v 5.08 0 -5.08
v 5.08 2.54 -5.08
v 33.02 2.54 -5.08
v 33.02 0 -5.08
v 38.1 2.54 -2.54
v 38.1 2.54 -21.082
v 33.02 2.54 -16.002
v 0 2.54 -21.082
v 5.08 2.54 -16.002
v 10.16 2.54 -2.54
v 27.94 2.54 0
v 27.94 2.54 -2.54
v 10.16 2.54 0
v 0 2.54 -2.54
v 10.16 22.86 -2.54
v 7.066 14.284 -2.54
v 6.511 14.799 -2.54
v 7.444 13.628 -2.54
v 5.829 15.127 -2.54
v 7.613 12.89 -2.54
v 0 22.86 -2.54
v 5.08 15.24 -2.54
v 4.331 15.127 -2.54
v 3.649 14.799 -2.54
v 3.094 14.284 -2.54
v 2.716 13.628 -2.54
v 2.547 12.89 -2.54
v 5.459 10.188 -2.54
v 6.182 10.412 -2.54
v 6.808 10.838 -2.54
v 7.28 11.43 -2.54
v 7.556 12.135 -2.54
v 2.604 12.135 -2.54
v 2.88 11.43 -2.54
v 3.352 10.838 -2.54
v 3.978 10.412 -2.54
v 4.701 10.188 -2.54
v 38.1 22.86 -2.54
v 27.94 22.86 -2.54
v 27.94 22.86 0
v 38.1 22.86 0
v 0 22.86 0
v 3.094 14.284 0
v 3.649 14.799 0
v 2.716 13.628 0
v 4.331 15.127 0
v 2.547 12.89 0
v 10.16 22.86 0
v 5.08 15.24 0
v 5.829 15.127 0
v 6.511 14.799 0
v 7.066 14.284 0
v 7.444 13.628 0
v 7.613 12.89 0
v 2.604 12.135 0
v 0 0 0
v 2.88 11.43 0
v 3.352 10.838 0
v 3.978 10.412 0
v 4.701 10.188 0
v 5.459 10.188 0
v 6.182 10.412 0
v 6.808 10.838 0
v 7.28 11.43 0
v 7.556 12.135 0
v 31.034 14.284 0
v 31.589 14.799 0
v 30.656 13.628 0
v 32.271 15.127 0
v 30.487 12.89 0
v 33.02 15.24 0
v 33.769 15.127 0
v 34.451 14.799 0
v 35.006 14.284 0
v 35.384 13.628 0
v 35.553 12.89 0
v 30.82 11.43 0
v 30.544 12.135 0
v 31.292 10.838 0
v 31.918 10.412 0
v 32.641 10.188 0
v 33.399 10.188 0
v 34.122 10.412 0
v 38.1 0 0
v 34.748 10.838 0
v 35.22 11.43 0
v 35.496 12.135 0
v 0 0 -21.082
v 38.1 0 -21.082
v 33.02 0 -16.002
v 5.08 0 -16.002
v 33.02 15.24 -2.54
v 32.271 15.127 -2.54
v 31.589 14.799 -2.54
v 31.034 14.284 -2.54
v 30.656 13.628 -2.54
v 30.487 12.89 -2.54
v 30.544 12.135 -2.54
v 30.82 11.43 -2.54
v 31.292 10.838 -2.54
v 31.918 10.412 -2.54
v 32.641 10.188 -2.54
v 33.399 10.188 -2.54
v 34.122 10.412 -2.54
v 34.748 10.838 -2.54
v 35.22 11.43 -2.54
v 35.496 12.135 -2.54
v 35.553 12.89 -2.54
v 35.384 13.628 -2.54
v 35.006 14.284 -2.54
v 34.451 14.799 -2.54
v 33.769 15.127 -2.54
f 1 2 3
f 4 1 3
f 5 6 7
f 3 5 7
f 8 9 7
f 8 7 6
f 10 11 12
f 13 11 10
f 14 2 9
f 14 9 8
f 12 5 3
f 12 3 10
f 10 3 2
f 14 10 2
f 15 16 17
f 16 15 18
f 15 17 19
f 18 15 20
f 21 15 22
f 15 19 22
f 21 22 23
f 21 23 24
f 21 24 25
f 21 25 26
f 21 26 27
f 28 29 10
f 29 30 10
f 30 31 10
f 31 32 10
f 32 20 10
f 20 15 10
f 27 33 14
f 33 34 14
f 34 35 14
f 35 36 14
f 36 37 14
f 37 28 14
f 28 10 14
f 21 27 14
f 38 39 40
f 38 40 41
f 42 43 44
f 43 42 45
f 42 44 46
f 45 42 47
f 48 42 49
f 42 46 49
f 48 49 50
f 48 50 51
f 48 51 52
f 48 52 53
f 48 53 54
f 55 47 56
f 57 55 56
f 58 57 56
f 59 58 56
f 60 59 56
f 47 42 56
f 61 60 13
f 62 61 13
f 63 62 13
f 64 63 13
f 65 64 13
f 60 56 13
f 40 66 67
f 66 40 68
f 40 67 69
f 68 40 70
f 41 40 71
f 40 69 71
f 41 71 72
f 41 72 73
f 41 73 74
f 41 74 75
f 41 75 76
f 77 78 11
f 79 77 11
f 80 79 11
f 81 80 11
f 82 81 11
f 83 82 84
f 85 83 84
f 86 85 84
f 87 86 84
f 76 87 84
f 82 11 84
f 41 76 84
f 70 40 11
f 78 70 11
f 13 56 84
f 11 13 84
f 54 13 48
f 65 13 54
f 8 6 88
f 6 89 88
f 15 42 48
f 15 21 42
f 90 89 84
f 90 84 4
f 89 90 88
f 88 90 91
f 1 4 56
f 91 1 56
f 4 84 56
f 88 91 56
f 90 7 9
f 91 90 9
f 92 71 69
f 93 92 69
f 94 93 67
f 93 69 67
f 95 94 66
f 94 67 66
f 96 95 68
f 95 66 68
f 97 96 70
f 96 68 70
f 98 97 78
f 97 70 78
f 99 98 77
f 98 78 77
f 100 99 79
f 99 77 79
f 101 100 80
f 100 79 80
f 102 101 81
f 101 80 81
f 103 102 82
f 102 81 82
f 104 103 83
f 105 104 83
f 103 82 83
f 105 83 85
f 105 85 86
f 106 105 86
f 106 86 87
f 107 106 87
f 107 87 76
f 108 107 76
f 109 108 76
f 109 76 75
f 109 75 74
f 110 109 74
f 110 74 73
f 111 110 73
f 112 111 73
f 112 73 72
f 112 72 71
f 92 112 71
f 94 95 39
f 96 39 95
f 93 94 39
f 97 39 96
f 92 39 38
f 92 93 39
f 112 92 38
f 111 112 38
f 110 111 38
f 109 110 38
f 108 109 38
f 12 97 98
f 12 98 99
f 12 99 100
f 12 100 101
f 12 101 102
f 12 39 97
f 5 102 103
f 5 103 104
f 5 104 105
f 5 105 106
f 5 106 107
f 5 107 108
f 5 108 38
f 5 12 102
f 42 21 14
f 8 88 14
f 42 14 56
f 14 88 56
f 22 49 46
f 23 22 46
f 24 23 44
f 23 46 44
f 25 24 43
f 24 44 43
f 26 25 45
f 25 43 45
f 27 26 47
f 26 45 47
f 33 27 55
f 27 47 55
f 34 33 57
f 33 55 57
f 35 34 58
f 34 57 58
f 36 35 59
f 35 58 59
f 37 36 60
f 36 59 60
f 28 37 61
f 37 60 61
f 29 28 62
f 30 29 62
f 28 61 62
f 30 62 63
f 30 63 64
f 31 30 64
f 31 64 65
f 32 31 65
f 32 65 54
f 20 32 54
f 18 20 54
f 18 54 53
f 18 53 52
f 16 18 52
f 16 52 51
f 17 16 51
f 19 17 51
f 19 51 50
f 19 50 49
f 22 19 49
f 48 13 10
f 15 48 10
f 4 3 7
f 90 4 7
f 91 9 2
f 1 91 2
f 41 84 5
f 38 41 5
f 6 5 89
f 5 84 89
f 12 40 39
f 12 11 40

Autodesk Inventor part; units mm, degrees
ref_plane "YZ Plane" through (0, 0, 0) normal (1, 0, 0) x (0, 1, 0)
ref_plane "XZ Plane" through (0, 0, 0) normal (0, 1, 0) x (-1, 0, 0)
ref_plane "XY Plane" through (0, 0, 0) normal (0, 0, 1) x (1, 0, 0)
sketch "Sketch1" plane through (0, 0, 0) normal (0, 1, 0) x (-1, 0, 0)
  point P0 (0, 0)
sketch "Sketch2" plane through (0, 0, 0) normal (0, 1, 0) x (-1, 0, 0)
  line L0 (0, 0) -> (-38.1, 0)
  line L1 (-38.1, 0) -> (-38.1, -21.082)
  line L2 (-38.1, -21.082) -> (0, -21.082)
  line L3 (0, -21.082) -> (0, 0)
  dimension "d0" = 38.1
  dimension "d1" = 21.082
extrude "Extrusion1" add sketch "Sketch2" along normal blind 2.54
sketch "Sketch3" plane through (0, 2.54, 0) normal (0, 1, 0) x (1, 0, 0)
  line L0 (0, 0) -> (5.08, 0)
  line L1 (5.08, 0) -> (5.08, 5.08)
  line L2 (5.08, 5.08) -> (0, 5.08)
  line L3 (0, 5.08) -> (0, 0)
  line L4 (38.1, 0) -> (38.1, 21.082) projected
  line L5 (38.1, 21.082) -> (33.02, 21.082)
  line L6 (33.02, 21.082) -> (33.02, 16.002)
  line L7 (33.02, 16.002) -> (38.1, 16.002)
  line L8 (38.1, 16.002) -> (38.1, 21.082)
  line L9 (5.08, 5.08) -> (33.02, 5.08)
  line L10 (33.02, 5.08) -> (33.02, 16.002)
  line L11 (33.02, 16.002) -> (5.08, 16.002)
  line L12 (5.08, 16.002) -> (5.08, 5.08)
  dimension "d4" = 5.08
  dimension "d5" = 5.08
  dimension "d6" = 5.08
  dimension "d7" = 5.08
extrude "Extrusion2" cut sketch "Sketch3" against normal blind 2.54 contours L12 L11 L10 L9
sketch "Sketch4" plane through (0, 2.54, 0) normal (0, 1, 0) x (1, 0, 0)
  line L0 (0, 0) -> (38.1, 0) projected
  line L1 (0, 0) -> (10.16, 0)
  line L2 (10.16, 0) -> (10.16, 2.54)
  line L3 (10.16, 2.54) -> (0, 2.54)
  line L4 (0, 2.54) -> (0, 0)
  line L5 (38.1, 0) -> (27.94, 0)
  line L6 (27.94, 0) -> (27.94, 2.54)
  line L7 (27.94, 2.54) -> (38.1, 2.54)
  line L8 (38.1, 2.54) -> (38.1, 0)
  dimension "d10" = 10.16
  dimension "d11" = 2.54
  dimension "d12" = 10.16
  dimension "d13" = 2.54
extrude "Extrusion3" add sketch "Sketch4" along normal blind 20.32
sketch "Sketch5" plane through (10.16, 2.54, -2.54) normal (0, 0, -1) x (-1, 0, 0)
  line L0 (10.16, 20.32) -> (0, 20.32) projected
  line L1 (5.08, 20.32) -> (5.08, 10.16)
  point P0 (10.16, -2.54)
  dimension "d16" = 10.16
hole "Hole1" at (5.08, 12.7, -2.54) direction (0, 0, 1) diameter 5.08 end through all
sketch "Sketch6" plane through (38.1, 2.54, -2.54) normal (0, 0, -1) x (-1, 0, 0)
  line L0 (10.16, 20.32) -> (0, 20.32) projected
  line L1 (5.08, 20.32) -> (5.08, 10.16)
  point P0 (38.1, -2.54)
  dimension "d24" = 10.16
hole "Hole2" at (33.02, 12.7, -2.54) direction (0, 0, 1) diameter 5.08 end through all
properties part number "Actobotics Power Switch Mount"
